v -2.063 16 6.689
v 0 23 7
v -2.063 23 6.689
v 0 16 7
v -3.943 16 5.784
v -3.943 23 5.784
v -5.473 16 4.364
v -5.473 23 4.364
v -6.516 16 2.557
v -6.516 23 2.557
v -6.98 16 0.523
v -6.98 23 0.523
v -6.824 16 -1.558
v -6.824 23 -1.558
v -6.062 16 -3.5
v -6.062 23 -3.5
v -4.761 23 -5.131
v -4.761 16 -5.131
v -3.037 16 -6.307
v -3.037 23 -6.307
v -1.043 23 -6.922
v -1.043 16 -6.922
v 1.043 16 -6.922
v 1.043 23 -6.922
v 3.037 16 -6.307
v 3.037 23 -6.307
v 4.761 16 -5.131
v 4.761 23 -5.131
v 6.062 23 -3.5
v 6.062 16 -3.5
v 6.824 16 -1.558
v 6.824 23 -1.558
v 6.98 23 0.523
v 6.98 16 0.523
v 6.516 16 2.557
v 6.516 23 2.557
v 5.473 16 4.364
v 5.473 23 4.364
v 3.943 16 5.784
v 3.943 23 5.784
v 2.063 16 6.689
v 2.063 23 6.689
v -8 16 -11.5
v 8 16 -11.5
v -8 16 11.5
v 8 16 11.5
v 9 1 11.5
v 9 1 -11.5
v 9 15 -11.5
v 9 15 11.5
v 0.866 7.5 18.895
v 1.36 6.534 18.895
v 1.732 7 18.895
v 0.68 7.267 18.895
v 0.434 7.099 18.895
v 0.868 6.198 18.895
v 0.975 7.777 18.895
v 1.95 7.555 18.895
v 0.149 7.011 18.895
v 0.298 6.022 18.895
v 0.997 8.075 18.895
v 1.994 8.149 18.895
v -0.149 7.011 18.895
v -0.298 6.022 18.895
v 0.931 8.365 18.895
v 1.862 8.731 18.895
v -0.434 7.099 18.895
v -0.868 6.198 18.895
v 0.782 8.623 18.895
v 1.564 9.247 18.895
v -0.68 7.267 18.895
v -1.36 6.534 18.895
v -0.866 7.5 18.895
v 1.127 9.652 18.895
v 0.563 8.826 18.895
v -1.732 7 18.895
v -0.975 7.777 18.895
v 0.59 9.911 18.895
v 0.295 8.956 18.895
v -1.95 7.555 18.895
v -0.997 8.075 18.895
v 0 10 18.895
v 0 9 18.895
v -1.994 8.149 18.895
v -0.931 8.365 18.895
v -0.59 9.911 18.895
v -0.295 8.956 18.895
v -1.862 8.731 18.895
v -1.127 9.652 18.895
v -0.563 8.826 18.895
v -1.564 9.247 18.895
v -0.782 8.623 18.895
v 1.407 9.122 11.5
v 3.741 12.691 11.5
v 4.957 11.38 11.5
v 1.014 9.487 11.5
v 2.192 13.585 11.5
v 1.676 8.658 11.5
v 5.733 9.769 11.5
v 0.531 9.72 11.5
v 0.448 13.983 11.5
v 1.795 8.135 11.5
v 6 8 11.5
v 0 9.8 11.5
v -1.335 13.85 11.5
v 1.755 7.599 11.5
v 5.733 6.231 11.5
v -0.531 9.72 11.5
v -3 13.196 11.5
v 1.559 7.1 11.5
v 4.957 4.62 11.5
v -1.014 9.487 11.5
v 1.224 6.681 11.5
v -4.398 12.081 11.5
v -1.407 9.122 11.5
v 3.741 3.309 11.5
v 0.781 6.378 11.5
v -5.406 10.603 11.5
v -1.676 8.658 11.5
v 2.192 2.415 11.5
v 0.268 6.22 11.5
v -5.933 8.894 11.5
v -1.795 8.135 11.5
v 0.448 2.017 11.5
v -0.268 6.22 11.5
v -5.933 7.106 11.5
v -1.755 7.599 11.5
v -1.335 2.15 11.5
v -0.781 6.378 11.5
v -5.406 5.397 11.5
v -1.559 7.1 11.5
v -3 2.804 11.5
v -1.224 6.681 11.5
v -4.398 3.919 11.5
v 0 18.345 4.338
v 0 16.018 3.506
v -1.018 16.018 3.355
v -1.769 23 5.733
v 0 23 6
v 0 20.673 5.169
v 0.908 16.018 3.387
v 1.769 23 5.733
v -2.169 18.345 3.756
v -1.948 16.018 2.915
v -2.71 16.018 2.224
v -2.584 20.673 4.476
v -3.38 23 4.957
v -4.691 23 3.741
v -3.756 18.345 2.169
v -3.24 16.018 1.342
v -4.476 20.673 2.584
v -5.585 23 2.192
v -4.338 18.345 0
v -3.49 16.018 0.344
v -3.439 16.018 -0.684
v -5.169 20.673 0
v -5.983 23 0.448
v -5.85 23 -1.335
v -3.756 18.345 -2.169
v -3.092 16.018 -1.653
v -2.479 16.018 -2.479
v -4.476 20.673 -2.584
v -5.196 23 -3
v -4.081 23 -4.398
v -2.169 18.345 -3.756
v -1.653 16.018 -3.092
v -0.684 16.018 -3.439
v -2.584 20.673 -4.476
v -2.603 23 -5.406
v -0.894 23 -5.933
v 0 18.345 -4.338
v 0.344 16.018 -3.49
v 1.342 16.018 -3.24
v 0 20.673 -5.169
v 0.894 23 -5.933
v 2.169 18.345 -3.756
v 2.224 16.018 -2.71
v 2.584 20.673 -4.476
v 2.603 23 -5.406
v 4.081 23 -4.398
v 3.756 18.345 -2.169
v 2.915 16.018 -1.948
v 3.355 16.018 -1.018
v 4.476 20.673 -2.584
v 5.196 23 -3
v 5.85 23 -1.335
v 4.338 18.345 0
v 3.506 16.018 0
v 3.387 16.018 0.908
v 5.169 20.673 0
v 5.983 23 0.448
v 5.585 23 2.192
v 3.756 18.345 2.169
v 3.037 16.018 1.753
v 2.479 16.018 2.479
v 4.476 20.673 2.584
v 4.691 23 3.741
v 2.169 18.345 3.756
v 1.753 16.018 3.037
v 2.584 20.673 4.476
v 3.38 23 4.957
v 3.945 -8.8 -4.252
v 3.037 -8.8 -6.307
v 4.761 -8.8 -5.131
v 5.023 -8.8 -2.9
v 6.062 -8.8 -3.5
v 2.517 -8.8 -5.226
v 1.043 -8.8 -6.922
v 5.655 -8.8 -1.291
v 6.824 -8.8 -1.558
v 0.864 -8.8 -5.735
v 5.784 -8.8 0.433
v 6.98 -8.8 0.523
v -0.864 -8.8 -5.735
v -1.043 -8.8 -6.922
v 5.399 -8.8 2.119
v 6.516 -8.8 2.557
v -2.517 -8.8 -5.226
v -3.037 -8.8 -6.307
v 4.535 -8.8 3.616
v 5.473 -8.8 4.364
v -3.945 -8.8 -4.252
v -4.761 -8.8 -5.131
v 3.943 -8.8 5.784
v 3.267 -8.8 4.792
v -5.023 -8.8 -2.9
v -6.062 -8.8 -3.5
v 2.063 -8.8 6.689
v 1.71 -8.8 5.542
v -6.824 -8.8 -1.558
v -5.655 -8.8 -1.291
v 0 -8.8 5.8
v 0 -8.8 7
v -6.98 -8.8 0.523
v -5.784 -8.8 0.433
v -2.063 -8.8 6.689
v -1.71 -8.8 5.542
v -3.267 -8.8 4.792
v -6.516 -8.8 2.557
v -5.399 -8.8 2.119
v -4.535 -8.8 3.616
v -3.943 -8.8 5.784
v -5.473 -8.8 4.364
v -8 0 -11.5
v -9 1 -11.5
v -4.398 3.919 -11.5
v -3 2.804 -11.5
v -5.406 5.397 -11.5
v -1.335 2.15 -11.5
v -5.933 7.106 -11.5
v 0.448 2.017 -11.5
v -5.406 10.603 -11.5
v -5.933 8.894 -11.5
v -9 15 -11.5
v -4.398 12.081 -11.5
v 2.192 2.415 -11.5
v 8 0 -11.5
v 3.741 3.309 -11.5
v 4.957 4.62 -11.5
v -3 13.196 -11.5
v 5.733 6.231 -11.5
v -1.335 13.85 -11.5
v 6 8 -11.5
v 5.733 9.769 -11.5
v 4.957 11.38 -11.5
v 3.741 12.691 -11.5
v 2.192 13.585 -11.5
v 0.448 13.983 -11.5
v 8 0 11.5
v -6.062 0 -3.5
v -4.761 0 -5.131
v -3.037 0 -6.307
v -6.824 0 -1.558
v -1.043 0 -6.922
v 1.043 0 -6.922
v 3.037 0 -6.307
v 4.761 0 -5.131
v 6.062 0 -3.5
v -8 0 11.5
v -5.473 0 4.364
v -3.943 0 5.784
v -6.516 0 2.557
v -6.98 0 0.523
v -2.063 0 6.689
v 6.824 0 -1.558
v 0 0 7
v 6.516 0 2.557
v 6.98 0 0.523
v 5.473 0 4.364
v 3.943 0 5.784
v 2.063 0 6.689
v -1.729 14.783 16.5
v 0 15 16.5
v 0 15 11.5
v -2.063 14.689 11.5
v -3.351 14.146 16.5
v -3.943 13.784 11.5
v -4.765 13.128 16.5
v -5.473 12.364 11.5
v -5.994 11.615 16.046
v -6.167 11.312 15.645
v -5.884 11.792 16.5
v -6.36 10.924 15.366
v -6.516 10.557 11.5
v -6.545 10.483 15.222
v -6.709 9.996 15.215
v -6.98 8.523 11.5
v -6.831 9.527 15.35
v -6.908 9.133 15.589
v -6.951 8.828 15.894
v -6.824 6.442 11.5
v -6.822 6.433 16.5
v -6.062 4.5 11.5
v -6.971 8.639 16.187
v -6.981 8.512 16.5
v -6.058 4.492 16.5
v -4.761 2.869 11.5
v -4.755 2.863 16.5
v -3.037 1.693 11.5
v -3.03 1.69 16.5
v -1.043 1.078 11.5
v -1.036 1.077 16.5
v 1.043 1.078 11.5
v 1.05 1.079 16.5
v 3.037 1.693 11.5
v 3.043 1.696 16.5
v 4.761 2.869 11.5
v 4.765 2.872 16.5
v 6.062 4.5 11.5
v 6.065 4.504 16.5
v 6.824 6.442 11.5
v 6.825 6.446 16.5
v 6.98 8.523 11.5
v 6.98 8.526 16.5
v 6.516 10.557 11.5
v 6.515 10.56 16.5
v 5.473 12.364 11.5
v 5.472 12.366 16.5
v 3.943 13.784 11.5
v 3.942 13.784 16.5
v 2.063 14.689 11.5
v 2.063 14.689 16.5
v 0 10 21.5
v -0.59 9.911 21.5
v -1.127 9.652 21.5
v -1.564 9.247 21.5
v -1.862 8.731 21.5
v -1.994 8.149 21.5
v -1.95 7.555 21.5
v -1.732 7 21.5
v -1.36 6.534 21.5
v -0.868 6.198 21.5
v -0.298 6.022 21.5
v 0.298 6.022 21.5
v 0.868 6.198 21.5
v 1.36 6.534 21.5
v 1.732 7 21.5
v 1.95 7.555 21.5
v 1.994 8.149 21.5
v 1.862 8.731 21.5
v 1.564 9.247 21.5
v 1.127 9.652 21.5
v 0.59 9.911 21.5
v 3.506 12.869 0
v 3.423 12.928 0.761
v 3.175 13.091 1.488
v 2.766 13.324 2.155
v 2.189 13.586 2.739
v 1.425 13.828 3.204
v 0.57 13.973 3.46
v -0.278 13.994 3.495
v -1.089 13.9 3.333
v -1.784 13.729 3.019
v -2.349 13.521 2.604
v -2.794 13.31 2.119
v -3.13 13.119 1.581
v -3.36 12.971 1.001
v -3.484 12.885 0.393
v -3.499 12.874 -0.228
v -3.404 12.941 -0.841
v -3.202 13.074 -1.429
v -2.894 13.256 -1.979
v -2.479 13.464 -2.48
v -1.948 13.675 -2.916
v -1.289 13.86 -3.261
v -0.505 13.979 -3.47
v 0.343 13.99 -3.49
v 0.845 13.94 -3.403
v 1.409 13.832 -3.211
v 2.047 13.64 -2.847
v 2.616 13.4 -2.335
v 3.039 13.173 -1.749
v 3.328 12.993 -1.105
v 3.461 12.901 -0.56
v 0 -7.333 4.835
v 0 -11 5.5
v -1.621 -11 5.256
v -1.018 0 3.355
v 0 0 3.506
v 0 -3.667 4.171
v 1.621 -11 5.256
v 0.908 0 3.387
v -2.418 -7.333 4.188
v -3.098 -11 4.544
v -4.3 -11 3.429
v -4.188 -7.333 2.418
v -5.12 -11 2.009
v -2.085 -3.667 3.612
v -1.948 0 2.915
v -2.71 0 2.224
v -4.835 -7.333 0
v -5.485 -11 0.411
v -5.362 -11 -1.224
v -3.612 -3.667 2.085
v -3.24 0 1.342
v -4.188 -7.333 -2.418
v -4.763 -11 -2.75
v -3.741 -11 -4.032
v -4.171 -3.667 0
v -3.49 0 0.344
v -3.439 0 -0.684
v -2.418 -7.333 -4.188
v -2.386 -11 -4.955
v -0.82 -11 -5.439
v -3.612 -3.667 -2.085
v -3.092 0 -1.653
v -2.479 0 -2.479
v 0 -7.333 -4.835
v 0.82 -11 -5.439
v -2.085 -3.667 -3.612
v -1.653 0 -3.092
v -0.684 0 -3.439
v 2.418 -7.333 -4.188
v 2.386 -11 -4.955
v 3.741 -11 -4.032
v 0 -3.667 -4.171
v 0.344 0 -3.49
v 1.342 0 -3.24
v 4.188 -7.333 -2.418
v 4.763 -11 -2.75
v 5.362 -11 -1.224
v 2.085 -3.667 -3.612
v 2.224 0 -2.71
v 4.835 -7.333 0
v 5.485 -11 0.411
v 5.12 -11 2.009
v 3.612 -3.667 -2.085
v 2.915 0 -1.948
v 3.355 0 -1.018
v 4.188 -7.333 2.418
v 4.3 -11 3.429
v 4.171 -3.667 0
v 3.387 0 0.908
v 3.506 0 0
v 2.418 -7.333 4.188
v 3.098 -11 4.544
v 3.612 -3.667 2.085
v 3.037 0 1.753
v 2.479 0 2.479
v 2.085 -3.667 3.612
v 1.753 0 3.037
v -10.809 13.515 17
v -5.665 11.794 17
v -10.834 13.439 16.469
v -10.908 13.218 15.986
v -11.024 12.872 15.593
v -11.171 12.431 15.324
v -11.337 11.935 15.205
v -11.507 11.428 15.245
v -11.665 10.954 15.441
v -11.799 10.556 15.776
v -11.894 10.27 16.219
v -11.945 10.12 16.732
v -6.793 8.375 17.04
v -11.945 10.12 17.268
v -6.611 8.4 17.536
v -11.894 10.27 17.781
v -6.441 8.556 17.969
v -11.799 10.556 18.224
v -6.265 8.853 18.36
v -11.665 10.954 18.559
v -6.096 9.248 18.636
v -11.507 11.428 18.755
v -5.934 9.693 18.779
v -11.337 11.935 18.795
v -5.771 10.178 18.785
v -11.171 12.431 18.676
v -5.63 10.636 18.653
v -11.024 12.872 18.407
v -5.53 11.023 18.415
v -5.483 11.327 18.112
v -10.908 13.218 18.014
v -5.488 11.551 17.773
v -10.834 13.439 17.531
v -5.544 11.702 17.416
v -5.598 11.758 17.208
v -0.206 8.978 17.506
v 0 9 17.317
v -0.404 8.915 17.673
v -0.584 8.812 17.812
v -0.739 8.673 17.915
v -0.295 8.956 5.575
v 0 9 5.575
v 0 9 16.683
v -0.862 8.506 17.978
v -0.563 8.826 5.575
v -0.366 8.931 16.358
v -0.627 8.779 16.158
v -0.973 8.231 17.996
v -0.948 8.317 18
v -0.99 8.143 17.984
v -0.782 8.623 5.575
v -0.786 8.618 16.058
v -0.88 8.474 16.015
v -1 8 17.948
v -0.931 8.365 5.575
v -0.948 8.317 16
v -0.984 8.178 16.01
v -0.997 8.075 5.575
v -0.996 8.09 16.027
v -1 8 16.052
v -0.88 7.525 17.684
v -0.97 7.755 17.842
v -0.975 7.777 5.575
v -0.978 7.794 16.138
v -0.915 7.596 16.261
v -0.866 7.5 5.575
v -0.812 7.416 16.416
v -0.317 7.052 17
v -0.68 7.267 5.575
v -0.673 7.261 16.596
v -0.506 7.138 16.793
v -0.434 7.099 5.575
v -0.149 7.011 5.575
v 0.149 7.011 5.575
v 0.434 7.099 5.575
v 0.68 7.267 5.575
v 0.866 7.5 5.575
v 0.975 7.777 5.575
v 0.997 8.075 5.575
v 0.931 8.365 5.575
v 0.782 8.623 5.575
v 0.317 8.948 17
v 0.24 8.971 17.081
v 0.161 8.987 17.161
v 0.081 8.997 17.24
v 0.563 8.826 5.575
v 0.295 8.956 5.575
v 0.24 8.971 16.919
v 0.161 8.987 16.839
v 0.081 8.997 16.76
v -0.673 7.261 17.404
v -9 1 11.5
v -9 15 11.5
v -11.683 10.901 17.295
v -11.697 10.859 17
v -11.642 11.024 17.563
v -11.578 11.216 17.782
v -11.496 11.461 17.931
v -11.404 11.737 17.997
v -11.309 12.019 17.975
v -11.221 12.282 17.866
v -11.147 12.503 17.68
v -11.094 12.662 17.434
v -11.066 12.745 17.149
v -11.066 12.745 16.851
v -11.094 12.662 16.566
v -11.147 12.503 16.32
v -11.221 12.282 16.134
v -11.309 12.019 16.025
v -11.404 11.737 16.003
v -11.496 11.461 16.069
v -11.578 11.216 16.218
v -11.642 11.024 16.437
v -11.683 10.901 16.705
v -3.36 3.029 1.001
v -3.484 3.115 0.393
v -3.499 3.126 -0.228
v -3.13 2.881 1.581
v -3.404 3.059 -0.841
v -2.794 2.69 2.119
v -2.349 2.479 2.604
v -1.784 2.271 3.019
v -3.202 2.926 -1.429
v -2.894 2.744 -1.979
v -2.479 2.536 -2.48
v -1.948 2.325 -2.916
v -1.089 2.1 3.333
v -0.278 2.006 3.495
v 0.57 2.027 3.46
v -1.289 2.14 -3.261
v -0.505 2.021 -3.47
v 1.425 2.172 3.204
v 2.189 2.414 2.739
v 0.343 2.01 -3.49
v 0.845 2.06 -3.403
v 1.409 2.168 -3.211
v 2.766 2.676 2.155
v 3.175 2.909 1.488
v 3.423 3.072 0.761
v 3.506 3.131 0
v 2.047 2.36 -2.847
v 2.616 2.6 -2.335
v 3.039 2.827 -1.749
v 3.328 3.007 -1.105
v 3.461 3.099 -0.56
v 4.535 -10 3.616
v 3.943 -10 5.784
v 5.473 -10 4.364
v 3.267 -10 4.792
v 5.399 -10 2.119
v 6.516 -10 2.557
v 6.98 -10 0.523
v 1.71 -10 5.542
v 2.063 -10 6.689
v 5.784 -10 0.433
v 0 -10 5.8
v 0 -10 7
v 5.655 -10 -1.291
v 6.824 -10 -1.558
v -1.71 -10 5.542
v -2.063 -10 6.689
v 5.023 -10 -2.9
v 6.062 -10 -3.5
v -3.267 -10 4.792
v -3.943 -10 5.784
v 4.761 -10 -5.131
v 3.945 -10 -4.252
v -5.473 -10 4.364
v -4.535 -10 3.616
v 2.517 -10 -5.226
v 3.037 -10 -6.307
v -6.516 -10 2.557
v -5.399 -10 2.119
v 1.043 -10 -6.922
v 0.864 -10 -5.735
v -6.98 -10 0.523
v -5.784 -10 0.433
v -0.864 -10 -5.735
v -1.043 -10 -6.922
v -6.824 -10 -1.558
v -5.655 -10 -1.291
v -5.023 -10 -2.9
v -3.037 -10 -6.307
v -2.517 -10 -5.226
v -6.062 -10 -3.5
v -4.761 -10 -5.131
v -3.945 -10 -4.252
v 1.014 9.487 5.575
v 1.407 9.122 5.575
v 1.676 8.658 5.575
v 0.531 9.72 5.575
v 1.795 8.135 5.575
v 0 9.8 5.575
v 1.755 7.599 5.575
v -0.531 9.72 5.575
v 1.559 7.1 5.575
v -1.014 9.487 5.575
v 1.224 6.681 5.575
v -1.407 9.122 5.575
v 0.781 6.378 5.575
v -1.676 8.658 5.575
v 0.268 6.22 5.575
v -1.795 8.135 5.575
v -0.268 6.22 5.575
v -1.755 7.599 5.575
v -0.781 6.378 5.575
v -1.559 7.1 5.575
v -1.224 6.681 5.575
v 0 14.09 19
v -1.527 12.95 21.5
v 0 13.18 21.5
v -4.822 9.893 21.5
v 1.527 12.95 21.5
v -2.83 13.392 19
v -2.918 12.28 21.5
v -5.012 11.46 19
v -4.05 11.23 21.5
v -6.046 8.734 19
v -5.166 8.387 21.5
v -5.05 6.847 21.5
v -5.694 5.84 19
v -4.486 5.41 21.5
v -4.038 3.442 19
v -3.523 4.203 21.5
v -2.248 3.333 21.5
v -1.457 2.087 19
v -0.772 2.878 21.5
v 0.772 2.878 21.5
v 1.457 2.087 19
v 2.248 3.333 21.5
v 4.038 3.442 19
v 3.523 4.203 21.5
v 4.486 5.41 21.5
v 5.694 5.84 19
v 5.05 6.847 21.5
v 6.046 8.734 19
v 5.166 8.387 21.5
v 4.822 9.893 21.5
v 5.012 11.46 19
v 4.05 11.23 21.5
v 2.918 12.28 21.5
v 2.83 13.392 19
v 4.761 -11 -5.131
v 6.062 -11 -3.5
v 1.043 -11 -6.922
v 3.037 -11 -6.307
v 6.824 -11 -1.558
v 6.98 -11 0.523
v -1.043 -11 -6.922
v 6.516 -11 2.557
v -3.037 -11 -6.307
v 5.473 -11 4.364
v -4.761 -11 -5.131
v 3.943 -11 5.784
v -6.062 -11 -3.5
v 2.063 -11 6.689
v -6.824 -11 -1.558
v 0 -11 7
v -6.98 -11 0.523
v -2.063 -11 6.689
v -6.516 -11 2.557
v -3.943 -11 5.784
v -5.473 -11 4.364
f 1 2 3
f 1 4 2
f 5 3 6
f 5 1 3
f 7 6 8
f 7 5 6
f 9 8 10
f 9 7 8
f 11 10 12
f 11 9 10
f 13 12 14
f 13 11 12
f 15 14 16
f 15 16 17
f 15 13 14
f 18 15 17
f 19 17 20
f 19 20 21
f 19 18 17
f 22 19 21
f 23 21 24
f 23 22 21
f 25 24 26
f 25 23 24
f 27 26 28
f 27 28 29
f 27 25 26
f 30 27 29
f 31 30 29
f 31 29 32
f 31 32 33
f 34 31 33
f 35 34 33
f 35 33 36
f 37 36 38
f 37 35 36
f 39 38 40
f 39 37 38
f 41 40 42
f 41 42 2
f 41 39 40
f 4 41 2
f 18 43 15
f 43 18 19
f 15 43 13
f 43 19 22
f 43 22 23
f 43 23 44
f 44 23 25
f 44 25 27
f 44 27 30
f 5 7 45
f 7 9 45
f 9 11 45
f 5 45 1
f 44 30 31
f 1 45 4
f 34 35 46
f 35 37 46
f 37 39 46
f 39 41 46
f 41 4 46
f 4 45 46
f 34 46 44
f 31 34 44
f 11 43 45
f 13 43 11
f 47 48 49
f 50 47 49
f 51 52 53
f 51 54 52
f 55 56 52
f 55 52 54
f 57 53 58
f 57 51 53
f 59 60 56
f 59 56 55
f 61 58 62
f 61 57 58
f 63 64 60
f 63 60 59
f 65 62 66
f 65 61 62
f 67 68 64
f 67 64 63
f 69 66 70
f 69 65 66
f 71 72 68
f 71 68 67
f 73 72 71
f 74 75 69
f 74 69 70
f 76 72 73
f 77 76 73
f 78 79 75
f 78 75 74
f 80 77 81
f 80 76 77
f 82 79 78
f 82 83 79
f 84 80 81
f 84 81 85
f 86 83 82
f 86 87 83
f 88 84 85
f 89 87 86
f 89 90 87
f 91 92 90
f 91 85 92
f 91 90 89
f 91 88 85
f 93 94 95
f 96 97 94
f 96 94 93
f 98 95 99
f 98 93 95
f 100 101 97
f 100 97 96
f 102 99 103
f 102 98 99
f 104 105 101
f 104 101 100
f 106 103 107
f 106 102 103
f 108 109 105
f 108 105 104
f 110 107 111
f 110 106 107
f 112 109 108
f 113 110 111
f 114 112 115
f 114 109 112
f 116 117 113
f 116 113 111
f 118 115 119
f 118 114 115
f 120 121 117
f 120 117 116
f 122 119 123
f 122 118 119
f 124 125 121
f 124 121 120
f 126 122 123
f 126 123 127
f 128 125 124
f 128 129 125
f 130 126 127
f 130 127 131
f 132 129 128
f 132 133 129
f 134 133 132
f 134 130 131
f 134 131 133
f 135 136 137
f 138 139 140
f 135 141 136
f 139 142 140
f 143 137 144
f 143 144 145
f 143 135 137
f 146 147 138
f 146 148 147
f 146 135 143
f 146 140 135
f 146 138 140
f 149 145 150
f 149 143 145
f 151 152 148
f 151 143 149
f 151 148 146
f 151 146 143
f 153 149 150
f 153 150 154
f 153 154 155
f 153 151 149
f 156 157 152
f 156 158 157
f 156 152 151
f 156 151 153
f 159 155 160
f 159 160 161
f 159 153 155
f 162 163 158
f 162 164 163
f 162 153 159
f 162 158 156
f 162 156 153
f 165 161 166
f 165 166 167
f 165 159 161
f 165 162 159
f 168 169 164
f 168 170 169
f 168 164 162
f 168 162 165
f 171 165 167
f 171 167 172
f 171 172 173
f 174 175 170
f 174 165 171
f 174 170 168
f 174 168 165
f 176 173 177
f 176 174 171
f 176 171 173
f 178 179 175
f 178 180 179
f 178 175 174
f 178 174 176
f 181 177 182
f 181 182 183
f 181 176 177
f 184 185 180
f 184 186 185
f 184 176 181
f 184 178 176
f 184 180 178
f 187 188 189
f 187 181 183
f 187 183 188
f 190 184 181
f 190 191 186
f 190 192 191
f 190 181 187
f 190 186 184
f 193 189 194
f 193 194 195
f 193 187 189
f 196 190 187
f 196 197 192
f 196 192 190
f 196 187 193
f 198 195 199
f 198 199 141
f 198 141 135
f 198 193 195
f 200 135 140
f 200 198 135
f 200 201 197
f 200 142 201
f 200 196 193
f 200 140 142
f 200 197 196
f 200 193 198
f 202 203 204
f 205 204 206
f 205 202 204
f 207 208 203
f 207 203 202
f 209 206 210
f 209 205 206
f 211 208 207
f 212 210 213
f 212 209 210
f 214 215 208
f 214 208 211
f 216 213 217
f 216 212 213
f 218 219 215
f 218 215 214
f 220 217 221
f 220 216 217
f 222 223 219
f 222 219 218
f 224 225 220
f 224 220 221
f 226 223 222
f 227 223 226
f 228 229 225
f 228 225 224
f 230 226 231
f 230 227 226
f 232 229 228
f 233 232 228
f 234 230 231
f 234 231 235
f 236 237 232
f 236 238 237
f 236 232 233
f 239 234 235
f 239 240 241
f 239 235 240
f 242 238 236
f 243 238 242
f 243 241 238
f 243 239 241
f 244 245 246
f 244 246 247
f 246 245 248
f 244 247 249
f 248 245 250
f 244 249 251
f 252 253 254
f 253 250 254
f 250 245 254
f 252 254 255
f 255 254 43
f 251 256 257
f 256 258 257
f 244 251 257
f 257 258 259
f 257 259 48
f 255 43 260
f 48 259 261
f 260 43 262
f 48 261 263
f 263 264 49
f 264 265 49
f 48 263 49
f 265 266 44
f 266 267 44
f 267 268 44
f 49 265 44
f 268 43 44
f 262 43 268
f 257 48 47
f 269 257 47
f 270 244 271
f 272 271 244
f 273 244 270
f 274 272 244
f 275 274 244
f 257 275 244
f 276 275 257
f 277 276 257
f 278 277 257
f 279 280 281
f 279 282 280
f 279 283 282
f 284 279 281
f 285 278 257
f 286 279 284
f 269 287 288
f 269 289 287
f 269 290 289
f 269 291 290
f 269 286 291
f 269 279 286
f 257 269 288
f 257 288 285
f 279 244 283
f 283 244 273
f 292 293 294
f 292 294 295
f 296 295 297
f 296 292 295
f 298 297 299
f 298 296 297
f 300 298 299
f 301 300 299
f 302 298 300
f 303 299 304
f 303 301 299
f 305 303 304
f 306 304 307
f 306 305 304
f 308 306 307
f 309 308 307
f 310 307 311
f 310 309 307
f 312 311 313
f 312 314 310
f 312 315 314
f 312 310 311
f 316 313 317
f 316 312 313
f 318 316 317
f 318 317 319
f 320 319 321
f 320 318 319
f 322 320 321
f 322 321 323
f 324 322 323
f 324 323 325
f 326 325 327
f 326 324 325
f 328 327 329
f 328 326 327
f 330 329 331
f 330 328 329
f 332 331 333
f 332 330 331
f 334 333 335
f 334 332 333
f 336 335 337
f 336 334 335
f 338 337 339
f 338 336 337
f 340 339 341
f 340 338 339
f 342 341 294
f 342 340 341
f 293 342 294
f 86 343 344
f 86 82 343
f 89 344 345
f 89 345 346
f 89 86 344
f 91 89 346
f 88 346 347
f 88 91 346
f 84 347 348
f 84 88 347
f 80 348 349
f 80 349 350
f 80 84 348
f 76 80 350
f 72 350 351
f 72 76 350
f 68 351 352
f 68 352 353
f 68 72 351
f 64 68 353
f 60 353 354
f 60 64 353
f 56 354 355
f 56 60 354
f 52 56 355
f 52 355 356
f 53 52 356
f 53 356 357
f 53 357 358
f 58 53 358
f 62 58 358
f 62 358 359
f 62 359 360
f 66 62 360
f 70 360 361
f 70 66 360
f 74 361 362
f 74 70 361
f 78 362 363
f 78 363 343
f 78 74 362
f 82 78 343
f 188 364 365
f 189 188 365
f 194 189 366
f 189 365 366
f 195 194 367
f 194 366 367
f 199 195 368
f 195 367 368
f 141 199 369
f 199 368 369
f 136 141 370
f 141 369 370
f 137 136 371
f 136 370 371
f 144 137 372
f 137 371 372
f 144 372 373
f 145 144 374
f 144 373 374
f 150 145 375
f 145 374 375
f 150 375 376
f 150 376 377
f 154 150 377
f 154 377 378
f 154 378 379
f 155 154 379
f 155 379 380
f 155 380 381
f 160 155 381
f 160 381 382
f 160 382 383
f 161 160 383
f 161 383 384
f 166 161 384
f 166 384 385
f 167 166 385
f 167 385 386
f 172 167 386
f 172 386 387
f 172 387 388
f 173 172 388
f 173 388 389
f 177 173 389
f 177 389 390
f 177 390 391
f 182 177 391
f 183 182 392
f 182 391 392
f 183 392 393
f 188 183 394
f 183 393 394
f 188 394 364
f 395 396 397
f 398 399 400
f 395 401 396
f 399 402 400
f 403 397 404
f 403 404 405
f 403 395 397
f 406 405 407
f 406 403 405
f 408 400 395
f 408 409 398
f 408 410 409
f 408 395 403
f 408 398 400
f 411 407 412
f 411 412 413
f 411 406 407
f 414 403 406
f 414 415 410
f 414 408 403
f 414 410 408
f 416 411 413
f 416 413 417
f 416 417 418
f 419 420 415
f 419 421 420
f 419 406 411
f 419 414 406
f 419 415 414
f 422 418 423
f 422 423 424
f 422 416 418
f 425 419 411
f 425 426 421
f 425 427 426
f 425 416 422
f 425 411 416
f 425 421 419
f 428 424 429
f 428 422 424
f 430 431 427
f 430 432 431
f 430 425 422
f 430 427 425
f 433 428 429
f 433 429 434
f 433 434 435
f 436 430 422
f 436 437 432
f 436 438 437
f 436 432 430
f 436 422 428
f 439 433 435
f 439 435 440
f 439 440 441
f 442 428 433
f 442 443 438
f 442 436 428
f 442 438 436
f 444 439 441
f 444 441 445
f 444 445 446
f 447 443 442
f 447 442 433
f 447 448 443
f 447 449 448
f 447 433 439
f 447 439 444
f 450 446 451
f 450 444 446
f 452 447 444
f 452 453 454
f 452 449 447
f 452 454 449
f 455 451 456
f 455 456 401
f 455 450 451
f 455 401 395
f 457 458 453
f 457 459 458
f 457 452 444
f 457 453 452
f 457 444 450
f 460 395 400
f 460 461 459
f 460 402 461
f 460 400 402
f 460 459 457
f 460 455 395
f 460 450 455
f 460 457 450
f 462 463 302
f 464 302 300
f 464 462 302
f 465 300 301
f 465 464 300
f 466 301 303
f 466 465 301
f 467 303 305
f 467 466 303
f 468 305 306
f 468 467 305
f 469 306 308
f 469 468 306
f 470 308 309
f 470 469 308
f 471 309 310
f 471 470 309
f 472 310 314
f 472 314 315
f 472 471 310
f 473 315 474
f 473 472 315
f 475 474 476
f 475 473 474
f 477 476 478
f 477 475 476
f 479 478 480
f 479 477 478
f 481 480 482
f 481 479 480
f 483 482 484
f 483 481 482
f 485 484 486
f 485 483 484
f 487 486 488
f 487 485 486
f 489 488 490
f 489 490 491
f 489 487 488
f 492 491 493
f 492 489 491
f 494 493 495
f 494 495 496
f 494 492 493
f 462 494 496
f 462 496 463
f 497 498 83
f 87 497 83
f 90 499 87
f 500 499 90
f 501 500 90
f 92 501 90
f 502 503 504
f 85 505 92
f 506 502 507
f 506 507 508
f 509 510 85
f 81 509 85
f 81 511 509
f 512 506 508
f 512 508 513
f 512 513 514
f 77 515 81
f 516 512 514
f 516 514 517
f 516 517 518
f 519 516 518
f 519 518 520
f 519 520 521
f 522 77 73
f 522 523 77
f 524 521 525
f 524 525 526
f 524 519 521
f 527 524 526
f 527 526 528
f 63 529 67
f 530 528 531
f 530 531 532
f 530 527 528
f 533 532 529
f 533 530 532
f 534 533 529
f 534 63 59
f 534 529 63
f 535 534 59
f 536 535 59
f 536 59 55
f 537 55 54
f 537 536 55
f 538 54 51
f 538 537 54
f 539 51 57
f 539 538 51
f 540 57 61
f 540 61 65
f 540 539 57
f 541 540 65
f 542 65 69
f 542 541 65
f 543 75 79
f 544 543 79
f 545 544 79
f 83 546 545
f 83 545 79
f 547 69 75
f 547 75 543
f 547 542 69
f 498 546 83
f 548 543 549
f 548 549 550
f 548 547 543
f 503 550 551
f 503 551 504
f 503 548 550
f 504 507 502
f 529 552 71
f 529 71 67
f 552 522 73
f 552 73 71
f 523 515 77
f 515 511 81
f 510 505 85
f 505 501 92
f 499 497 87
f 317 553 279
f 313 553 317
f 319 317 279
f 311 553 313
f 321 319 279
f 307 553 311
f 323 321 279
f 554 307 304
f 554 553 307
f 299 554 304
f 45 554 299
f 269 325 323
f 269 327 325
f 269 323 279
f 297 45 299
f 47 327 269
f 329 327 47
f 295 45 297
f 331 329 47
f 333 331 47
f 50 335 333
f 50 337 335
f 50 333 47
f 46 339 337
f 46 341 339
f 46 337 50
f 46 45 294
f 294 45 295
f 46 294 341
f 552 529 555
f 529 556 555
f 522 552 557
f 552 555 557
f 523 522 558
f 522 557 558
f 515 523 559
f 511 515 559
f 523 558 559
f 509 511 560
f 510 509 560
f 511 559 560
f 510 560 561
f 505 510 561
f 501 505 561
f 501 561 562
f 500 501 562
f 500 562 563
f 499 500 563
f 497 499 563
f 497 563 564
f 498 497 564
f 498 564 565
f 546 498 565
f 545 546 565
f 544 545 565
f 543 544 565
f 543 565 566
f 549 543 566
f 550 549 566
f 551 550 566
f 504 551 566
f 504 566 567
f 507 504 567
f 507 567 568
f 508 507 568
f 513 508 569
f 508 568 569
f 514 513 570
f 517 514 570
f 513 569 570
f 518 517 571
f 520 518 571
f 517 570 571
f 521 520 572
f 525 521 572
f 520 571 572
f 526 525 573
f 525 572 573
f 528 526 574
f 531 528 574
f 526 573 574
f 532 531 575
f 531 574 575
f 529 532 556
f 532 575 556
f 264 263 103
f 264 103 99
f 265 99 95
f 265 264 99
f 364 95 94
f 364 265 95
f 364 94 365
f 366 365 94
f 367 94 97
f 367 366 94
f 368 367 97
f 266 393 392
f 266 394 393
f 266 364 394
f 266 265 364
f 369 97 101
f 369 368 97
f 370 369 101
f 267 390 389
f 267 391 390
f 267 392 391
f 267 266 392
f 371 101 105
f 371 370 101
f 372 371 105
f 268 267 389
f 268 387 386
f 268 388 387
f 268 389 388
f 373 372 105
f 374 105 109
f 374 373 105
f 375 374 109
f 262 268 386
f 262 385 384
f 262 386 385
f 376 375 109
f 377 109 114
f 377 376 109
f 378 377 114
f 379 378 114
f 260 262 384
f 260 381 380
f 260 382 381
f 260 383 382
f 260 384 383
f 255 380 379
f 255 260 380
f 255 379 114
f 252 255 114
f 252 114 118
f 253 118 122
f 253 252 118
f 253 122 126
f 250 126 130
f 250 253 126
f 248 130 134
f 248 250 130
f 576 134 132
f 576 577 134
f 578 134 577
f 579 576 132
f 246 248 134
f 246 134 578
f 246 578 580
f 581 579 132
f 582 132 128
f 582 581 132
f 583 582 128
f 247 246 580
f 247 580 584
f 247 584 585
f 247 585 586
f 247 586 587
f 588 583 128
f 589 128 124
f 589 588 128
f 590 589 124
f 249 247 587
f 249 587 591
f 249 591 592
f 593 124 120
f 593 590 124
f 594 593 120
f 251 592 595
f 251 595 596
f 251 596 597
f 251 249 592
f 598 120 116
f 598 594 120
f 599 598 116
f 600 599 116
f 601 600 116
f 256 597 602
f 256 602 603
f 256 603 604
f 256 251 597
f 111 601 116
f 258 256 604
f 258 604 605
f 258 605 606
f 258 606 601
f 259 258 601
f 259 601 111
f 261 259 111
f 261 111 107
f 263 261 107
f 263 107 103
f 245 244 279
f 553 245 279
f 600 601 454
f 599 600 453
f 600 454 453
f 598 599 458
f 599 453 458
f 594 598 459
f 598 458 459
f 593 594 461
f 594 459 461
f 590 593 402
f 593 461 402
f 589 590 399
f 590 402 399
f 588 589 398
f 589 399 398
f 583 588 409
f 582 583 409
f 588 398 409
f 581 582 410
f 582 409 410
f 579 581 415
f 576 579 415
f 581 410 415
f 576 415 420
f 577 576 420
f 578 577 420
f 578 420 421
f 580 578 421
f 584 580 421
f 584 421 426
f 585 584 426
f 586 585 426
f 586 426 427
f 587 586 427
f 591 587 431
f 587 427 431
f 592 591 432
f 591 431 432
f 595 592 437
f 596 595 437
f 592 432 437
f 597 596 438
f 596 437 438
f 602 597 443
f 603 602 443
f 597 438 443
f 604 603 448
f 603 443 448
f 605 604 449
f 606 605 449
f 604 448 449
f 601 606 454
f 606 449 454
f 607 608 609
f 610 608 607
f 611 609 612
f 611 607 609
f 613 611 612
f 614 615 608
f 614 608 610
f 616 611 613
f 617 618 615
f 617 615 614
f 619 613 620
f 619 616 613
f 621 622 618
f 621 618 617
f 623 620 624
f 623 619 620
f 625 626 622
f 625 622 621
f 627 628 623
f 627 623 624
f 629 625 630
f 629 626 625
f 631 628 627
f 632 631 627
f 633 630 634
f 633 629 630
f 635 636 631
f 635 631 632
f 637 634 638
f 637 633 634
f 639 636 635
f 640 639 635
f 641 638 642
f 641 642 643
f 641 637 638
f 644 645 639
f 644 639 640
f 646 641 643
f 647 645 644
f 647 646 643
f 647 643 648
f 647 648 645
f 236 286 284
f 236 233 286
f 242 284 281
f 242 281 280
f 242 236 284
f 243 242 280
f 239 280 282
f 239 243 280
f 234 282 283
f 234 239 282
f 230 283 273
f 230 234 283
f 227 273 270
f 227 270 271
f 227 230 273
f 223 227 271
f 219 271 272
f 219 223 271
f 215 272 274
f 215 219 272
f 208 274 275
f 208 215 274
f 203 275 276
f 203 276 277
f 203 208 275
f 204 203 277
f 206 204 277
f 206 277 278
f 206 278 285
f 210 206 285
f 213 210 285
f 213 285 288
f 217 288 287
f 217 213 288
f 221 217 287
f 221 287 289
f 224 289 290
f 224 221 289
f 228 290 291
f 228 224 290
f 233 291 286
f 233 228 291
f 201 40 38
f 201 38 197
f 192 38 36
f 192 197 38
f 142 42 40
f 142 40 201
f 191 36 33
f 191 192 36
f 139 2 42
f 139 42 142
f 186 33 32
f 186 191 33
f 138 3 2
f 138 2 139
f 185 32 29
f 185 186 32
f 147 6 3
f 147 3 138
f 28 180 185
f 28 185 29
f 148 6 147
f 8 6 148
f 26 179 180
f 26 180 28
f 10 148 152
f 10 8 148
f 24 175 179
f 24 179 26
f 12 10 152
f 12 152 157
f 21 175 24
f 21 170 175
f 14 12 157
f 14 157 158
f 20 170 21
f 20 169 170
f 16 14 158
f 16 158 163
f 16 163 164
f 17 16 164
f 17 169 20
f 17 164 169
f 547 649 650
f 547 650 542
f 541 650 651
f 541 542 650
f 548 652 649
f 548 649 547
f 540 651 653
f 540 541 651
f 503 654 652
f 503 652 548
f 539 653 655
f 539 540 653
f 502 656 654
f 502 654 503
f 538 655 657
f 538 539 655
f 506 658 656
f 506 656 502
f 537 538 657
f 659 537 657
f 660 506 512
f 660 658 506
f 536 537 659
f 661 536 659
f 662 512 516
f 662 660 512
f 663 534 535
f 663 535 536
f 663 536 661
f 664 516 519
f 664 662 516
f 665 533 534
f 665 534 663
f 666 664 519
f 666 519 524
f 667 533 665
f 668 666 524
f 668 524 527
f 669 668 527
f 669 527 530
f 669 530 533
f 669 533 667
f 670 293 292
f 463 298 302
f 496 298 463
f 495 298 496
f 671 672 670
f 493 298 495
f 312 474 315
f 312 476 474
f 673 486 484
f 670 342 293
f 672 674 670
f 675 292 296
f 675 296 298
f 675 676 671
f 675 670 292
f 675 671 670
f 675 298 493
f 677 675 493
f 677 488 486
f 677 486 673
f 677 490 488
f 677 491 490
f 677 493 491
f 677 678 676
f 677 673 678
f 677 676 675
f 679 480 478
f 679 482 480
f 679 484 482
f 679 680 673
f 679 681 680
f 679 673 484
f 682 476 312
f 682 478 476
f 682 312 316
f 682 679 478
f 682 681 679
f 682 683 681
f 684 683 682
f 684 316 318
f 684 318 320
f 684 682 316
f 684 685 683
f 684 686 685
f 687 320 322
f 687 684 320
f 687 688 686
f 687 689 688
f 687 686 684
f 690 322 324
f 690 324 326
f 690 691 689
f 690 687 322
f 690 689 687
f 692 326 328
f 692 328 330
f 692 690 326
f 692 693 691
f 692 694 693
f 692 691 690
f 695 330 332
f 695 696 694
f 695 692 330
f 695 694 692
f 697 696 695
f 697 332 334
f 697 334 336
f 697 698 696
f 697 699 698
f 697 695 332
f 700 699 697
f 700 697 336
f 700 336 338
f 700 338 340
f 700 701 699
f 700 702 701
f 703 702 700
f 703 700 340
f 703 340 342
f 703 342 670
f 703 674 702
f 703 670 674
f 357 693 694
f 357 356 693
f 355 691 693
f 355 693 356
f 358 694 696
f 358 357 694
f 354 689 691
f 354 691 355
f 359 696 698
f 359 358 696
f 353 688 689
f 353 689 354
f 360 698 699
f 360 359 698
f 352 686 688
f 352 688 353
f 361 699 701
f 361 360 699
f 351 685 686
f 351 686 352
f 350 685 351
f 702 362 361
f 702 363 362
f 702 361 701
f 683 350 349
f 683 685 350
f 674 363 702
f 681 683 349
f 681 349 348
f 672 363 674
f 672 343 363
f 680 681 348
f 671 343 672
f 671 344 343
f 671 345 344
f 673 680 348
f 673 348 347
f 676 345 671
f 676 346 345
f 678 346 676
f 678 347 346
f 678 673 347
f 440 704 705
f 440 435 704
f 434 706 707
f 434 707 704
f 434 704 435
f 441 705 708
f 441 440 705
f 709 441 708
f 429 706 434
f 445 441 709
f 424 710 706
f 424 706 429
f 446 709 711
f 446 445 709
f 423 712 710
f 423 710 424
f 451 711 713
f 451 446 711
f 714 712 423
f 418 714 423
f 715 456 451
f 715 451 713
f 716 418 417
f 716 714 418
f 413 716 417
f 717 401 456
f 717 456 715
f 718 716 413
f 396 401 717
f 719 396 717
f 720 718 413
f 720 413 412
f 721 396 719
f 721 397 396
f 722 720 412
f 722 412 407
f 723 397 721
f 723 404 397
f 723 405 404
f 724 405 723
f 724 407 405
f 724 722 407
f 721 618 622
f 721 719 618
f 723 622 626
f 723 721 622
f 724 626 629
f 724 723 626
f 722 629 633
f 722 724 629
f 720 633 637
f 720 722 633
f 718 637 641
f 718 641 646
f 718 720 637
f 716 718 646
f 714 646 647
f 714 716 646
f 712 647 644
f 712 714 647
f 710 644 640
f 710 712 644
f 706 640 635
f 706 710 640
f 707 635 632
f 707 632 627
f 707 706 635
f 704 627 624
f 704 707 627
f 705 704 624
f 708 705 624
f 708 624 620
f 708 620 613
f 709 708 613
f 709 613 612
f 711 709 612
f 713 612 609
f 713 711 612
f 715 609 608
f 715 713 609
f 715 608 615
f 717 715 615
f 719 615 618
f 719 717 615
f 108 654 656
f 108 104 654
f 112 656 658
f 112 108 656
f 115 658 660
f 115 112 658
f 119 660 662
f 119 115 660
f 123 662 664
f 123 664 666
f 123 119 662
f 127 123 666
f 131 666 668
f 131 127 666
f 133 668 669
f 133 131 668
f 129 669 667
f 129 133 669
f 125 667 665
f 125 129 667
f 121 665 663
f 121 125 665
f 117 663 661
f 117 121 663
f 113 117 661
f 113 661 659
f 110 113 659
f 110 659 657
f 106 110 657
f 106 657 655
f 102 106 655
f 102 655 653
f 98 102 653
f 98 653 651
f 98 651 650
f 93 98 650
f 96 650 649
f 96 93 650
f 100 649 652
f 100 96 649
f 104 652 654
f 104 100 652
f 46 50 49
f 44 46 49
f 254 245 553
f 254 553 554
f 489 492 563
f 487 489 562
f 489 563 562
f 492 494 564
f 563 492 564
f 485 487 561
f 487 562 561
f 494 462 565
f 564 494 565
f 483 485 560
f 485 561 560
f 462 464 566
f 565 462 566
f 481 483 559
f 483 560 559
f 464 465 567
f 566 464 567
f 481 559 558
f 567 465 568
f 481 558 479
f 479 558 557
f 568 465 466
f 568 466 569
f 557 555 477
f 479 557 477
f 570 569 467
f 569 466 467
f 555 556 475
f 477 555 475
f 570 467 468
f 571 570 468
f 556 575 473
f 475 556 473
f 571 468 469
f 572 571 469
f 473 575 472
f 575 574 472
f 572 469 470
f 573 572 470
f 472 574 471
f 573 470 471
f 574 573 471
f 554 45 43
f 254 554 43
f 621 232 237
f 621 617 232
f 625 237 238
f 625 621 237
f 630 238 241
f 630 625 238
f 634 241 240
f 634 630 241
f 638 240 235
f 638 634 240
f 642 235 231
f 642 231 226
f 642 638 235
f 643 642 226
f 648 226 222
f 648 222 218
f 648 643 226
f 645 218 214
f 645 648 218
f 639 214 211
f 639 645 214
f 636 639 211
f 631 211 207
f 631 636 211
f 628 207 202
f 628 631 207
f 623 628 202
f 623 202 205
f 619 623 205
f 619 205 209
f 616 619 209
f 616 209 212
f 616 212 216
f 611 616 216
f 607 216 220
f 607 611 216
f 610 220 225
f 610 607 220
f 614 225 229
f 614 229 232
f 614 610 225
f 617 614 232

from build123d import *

# Parameters (mm, degrees)
ESQUISSE1_W                  = 18
ESQUISSE1_H                  = 16
ESQUISSE1_R                  = 6
BASE_EXTRUSION_DEPTH         = 11.5
ESQUISSE6_R                  = 3.506411758
ENL_V_MAT_EXTRU_1_DEPTH      = 28.244265452
CHANFREIN1_SIZE              = 1
ESQUISSE9_W                  = 7.559075372
ESQUISSE9_H                  = 1.8
ENL_V_MAT_EXTRU_2_REACH      = 38.326
ENL_V_MAT_EXTRU_2_END_RADIUS = 1
ESQUISSE10_R                 = 1


with BuildPart() as part:
    # Esquisse1 → Base-Extrusion (new, symmetric)
    with BuildSketch(Plane.XY):
        with Locations((0, 8)):
            Rectangle(ESQUISSE1_W, ESQUISSE1_H)
        with Locations((0, 8)):
            Circle(ESQUISSE1_R, mode=Mode.SUBTRACT)
    extrude(amount=BASE_EXTRUSION_DEPTH, both=True)

    # Esquisse5 → Boss.-Révol.1 (revolve)
    with BuildSketch(Plane(origin=(0, 0, 0), x_dir=(0, 0, -1), z_dir=(1, 0, 0)), mode=Mode.PRIVATE) as boss_r_vol_1_sk:
        Polygon((7, -10), (7, -11), (5.5, -11), (3.506411758, 0), (7, 0), (7, -8.8), (5.8, -8.8), (5.8, -10), align=None)
        Polygon((7, 16), (3.5, 16), (6, 23), (7, 23), align=None)
    revolve(boss_r_vol_1_sk.sketch.rotate(Axis((0, 26.536034952, 0), (0, -1, 0)), 180), axis=Axis((0, 26.536034952, 0), (0, -1, 0)))

    # Esquisse6 → Enlèv. mat.-Extru.1 (cut, through all)
    with BuildSketch(Plane.XZ):
        Circle(ESQUISSE6_R)
    extrude(amount=-ENL_V_MAT_EXTRU_1_DEPTH, mode=Mode.SUBTRACT)

    # Esquisse8 → Boss.-Révol.2 (revolve)
    with BuildSketch(Plane(origin=(0, 0, 0), x_dir=(0, 0, -1), z_dir=(1, 0, 0))):
        Polygon((-11.5, 15), (-16.5, 15), (-21.5, 13.180148829), (-21.5, 10), (-18.894611613, 10), (-18.894611613, 9), (-5.574935919, 9), (-5.574935919, 9.8), (-11.5, 9.8), align=None)
    revolve(axis=Axis((0, 8, 5.789251087), (0, 0, 1)))

    # Chanfrein1
    chanfrein1_edges = [part.edges().sort_by_distance(p)[0] for p in [
        (9, 16, 0),
        (9, 0, 0),
        (-9, 0, 0),
        (-9, 16, 0),
    ]]
    chamfer(chanfrein1_edges, length=CHANFREIN1_SIZE)

    # Esquisse9 → Boss.-Révol.3 (revolve)
    with BuildSketch(Plane(origin=(2.407260093, 7.19454204, 0), x_dir=(-0.9483236552062002, 0.31730465640508954, 0), z_dir=(0.31730465640508954, 0.9483236552062002, 0)), mode=Mode.PRIVATE) as boss_r_vol_3_sk:
        with Locations((10.758899565, 17.9)):
            Rectangle(ESQUISSE9_W, ESQUISSE9_H)
    revolve(boss_r_vol_3_sk.sketch.rotate(Axis((0, 8, 17), (-0.9483236552062002, 0.3173046564050896, 0)), 90), axis=Axis((0, 8, 17), (-0.9483236552062002, 0.3173046564050896, 0)))

    # Enlèv. mat.-Extru.2: up to this cylinder (the profile starts outside it)
    enl_v_mat_extru_2_end = Plane(origin=(0, 8, 17), z_dir=(0, 0, -1)) * Cylinder(ENL_V_MAT_EXTRU_2_END_RADIUS, 79.652, mode=Mode.PRIVATE)
    # Esquisse10 → Enlèv. mat.-Extru.2 (cut, up to the surface)
    with BuildSketch(Plane(origin=(-13.787143955, 4.613113837, 0), x_dir=(0, 0, 1), z_dir=(-0.9483236552062002, 0.31730465640508954, 0)), mode=Mode.PRIVATE) as enl_v_mat_extru_2_sk1:
        with Locations(Location((17, 7.586589242, 0), (0, 0, 270))):
            Circle(ESQUISSE10_R)
    enl_v_mat_extru_2_tool1 = extrude(enl_v_mat_extru_2_sk1.sketch, amount=-ENL_V_MAT_EXTRU_2_REACH, mode=Mode.PRIVATE) - enl_v_mat_extru_2_end
    add(enl_v_mat_extru_2_tool1.solids().sort_by_distance((-11.379884, 11.807656, 17))[0], mode=Mode.SUBTRACT)


solid = part.part
